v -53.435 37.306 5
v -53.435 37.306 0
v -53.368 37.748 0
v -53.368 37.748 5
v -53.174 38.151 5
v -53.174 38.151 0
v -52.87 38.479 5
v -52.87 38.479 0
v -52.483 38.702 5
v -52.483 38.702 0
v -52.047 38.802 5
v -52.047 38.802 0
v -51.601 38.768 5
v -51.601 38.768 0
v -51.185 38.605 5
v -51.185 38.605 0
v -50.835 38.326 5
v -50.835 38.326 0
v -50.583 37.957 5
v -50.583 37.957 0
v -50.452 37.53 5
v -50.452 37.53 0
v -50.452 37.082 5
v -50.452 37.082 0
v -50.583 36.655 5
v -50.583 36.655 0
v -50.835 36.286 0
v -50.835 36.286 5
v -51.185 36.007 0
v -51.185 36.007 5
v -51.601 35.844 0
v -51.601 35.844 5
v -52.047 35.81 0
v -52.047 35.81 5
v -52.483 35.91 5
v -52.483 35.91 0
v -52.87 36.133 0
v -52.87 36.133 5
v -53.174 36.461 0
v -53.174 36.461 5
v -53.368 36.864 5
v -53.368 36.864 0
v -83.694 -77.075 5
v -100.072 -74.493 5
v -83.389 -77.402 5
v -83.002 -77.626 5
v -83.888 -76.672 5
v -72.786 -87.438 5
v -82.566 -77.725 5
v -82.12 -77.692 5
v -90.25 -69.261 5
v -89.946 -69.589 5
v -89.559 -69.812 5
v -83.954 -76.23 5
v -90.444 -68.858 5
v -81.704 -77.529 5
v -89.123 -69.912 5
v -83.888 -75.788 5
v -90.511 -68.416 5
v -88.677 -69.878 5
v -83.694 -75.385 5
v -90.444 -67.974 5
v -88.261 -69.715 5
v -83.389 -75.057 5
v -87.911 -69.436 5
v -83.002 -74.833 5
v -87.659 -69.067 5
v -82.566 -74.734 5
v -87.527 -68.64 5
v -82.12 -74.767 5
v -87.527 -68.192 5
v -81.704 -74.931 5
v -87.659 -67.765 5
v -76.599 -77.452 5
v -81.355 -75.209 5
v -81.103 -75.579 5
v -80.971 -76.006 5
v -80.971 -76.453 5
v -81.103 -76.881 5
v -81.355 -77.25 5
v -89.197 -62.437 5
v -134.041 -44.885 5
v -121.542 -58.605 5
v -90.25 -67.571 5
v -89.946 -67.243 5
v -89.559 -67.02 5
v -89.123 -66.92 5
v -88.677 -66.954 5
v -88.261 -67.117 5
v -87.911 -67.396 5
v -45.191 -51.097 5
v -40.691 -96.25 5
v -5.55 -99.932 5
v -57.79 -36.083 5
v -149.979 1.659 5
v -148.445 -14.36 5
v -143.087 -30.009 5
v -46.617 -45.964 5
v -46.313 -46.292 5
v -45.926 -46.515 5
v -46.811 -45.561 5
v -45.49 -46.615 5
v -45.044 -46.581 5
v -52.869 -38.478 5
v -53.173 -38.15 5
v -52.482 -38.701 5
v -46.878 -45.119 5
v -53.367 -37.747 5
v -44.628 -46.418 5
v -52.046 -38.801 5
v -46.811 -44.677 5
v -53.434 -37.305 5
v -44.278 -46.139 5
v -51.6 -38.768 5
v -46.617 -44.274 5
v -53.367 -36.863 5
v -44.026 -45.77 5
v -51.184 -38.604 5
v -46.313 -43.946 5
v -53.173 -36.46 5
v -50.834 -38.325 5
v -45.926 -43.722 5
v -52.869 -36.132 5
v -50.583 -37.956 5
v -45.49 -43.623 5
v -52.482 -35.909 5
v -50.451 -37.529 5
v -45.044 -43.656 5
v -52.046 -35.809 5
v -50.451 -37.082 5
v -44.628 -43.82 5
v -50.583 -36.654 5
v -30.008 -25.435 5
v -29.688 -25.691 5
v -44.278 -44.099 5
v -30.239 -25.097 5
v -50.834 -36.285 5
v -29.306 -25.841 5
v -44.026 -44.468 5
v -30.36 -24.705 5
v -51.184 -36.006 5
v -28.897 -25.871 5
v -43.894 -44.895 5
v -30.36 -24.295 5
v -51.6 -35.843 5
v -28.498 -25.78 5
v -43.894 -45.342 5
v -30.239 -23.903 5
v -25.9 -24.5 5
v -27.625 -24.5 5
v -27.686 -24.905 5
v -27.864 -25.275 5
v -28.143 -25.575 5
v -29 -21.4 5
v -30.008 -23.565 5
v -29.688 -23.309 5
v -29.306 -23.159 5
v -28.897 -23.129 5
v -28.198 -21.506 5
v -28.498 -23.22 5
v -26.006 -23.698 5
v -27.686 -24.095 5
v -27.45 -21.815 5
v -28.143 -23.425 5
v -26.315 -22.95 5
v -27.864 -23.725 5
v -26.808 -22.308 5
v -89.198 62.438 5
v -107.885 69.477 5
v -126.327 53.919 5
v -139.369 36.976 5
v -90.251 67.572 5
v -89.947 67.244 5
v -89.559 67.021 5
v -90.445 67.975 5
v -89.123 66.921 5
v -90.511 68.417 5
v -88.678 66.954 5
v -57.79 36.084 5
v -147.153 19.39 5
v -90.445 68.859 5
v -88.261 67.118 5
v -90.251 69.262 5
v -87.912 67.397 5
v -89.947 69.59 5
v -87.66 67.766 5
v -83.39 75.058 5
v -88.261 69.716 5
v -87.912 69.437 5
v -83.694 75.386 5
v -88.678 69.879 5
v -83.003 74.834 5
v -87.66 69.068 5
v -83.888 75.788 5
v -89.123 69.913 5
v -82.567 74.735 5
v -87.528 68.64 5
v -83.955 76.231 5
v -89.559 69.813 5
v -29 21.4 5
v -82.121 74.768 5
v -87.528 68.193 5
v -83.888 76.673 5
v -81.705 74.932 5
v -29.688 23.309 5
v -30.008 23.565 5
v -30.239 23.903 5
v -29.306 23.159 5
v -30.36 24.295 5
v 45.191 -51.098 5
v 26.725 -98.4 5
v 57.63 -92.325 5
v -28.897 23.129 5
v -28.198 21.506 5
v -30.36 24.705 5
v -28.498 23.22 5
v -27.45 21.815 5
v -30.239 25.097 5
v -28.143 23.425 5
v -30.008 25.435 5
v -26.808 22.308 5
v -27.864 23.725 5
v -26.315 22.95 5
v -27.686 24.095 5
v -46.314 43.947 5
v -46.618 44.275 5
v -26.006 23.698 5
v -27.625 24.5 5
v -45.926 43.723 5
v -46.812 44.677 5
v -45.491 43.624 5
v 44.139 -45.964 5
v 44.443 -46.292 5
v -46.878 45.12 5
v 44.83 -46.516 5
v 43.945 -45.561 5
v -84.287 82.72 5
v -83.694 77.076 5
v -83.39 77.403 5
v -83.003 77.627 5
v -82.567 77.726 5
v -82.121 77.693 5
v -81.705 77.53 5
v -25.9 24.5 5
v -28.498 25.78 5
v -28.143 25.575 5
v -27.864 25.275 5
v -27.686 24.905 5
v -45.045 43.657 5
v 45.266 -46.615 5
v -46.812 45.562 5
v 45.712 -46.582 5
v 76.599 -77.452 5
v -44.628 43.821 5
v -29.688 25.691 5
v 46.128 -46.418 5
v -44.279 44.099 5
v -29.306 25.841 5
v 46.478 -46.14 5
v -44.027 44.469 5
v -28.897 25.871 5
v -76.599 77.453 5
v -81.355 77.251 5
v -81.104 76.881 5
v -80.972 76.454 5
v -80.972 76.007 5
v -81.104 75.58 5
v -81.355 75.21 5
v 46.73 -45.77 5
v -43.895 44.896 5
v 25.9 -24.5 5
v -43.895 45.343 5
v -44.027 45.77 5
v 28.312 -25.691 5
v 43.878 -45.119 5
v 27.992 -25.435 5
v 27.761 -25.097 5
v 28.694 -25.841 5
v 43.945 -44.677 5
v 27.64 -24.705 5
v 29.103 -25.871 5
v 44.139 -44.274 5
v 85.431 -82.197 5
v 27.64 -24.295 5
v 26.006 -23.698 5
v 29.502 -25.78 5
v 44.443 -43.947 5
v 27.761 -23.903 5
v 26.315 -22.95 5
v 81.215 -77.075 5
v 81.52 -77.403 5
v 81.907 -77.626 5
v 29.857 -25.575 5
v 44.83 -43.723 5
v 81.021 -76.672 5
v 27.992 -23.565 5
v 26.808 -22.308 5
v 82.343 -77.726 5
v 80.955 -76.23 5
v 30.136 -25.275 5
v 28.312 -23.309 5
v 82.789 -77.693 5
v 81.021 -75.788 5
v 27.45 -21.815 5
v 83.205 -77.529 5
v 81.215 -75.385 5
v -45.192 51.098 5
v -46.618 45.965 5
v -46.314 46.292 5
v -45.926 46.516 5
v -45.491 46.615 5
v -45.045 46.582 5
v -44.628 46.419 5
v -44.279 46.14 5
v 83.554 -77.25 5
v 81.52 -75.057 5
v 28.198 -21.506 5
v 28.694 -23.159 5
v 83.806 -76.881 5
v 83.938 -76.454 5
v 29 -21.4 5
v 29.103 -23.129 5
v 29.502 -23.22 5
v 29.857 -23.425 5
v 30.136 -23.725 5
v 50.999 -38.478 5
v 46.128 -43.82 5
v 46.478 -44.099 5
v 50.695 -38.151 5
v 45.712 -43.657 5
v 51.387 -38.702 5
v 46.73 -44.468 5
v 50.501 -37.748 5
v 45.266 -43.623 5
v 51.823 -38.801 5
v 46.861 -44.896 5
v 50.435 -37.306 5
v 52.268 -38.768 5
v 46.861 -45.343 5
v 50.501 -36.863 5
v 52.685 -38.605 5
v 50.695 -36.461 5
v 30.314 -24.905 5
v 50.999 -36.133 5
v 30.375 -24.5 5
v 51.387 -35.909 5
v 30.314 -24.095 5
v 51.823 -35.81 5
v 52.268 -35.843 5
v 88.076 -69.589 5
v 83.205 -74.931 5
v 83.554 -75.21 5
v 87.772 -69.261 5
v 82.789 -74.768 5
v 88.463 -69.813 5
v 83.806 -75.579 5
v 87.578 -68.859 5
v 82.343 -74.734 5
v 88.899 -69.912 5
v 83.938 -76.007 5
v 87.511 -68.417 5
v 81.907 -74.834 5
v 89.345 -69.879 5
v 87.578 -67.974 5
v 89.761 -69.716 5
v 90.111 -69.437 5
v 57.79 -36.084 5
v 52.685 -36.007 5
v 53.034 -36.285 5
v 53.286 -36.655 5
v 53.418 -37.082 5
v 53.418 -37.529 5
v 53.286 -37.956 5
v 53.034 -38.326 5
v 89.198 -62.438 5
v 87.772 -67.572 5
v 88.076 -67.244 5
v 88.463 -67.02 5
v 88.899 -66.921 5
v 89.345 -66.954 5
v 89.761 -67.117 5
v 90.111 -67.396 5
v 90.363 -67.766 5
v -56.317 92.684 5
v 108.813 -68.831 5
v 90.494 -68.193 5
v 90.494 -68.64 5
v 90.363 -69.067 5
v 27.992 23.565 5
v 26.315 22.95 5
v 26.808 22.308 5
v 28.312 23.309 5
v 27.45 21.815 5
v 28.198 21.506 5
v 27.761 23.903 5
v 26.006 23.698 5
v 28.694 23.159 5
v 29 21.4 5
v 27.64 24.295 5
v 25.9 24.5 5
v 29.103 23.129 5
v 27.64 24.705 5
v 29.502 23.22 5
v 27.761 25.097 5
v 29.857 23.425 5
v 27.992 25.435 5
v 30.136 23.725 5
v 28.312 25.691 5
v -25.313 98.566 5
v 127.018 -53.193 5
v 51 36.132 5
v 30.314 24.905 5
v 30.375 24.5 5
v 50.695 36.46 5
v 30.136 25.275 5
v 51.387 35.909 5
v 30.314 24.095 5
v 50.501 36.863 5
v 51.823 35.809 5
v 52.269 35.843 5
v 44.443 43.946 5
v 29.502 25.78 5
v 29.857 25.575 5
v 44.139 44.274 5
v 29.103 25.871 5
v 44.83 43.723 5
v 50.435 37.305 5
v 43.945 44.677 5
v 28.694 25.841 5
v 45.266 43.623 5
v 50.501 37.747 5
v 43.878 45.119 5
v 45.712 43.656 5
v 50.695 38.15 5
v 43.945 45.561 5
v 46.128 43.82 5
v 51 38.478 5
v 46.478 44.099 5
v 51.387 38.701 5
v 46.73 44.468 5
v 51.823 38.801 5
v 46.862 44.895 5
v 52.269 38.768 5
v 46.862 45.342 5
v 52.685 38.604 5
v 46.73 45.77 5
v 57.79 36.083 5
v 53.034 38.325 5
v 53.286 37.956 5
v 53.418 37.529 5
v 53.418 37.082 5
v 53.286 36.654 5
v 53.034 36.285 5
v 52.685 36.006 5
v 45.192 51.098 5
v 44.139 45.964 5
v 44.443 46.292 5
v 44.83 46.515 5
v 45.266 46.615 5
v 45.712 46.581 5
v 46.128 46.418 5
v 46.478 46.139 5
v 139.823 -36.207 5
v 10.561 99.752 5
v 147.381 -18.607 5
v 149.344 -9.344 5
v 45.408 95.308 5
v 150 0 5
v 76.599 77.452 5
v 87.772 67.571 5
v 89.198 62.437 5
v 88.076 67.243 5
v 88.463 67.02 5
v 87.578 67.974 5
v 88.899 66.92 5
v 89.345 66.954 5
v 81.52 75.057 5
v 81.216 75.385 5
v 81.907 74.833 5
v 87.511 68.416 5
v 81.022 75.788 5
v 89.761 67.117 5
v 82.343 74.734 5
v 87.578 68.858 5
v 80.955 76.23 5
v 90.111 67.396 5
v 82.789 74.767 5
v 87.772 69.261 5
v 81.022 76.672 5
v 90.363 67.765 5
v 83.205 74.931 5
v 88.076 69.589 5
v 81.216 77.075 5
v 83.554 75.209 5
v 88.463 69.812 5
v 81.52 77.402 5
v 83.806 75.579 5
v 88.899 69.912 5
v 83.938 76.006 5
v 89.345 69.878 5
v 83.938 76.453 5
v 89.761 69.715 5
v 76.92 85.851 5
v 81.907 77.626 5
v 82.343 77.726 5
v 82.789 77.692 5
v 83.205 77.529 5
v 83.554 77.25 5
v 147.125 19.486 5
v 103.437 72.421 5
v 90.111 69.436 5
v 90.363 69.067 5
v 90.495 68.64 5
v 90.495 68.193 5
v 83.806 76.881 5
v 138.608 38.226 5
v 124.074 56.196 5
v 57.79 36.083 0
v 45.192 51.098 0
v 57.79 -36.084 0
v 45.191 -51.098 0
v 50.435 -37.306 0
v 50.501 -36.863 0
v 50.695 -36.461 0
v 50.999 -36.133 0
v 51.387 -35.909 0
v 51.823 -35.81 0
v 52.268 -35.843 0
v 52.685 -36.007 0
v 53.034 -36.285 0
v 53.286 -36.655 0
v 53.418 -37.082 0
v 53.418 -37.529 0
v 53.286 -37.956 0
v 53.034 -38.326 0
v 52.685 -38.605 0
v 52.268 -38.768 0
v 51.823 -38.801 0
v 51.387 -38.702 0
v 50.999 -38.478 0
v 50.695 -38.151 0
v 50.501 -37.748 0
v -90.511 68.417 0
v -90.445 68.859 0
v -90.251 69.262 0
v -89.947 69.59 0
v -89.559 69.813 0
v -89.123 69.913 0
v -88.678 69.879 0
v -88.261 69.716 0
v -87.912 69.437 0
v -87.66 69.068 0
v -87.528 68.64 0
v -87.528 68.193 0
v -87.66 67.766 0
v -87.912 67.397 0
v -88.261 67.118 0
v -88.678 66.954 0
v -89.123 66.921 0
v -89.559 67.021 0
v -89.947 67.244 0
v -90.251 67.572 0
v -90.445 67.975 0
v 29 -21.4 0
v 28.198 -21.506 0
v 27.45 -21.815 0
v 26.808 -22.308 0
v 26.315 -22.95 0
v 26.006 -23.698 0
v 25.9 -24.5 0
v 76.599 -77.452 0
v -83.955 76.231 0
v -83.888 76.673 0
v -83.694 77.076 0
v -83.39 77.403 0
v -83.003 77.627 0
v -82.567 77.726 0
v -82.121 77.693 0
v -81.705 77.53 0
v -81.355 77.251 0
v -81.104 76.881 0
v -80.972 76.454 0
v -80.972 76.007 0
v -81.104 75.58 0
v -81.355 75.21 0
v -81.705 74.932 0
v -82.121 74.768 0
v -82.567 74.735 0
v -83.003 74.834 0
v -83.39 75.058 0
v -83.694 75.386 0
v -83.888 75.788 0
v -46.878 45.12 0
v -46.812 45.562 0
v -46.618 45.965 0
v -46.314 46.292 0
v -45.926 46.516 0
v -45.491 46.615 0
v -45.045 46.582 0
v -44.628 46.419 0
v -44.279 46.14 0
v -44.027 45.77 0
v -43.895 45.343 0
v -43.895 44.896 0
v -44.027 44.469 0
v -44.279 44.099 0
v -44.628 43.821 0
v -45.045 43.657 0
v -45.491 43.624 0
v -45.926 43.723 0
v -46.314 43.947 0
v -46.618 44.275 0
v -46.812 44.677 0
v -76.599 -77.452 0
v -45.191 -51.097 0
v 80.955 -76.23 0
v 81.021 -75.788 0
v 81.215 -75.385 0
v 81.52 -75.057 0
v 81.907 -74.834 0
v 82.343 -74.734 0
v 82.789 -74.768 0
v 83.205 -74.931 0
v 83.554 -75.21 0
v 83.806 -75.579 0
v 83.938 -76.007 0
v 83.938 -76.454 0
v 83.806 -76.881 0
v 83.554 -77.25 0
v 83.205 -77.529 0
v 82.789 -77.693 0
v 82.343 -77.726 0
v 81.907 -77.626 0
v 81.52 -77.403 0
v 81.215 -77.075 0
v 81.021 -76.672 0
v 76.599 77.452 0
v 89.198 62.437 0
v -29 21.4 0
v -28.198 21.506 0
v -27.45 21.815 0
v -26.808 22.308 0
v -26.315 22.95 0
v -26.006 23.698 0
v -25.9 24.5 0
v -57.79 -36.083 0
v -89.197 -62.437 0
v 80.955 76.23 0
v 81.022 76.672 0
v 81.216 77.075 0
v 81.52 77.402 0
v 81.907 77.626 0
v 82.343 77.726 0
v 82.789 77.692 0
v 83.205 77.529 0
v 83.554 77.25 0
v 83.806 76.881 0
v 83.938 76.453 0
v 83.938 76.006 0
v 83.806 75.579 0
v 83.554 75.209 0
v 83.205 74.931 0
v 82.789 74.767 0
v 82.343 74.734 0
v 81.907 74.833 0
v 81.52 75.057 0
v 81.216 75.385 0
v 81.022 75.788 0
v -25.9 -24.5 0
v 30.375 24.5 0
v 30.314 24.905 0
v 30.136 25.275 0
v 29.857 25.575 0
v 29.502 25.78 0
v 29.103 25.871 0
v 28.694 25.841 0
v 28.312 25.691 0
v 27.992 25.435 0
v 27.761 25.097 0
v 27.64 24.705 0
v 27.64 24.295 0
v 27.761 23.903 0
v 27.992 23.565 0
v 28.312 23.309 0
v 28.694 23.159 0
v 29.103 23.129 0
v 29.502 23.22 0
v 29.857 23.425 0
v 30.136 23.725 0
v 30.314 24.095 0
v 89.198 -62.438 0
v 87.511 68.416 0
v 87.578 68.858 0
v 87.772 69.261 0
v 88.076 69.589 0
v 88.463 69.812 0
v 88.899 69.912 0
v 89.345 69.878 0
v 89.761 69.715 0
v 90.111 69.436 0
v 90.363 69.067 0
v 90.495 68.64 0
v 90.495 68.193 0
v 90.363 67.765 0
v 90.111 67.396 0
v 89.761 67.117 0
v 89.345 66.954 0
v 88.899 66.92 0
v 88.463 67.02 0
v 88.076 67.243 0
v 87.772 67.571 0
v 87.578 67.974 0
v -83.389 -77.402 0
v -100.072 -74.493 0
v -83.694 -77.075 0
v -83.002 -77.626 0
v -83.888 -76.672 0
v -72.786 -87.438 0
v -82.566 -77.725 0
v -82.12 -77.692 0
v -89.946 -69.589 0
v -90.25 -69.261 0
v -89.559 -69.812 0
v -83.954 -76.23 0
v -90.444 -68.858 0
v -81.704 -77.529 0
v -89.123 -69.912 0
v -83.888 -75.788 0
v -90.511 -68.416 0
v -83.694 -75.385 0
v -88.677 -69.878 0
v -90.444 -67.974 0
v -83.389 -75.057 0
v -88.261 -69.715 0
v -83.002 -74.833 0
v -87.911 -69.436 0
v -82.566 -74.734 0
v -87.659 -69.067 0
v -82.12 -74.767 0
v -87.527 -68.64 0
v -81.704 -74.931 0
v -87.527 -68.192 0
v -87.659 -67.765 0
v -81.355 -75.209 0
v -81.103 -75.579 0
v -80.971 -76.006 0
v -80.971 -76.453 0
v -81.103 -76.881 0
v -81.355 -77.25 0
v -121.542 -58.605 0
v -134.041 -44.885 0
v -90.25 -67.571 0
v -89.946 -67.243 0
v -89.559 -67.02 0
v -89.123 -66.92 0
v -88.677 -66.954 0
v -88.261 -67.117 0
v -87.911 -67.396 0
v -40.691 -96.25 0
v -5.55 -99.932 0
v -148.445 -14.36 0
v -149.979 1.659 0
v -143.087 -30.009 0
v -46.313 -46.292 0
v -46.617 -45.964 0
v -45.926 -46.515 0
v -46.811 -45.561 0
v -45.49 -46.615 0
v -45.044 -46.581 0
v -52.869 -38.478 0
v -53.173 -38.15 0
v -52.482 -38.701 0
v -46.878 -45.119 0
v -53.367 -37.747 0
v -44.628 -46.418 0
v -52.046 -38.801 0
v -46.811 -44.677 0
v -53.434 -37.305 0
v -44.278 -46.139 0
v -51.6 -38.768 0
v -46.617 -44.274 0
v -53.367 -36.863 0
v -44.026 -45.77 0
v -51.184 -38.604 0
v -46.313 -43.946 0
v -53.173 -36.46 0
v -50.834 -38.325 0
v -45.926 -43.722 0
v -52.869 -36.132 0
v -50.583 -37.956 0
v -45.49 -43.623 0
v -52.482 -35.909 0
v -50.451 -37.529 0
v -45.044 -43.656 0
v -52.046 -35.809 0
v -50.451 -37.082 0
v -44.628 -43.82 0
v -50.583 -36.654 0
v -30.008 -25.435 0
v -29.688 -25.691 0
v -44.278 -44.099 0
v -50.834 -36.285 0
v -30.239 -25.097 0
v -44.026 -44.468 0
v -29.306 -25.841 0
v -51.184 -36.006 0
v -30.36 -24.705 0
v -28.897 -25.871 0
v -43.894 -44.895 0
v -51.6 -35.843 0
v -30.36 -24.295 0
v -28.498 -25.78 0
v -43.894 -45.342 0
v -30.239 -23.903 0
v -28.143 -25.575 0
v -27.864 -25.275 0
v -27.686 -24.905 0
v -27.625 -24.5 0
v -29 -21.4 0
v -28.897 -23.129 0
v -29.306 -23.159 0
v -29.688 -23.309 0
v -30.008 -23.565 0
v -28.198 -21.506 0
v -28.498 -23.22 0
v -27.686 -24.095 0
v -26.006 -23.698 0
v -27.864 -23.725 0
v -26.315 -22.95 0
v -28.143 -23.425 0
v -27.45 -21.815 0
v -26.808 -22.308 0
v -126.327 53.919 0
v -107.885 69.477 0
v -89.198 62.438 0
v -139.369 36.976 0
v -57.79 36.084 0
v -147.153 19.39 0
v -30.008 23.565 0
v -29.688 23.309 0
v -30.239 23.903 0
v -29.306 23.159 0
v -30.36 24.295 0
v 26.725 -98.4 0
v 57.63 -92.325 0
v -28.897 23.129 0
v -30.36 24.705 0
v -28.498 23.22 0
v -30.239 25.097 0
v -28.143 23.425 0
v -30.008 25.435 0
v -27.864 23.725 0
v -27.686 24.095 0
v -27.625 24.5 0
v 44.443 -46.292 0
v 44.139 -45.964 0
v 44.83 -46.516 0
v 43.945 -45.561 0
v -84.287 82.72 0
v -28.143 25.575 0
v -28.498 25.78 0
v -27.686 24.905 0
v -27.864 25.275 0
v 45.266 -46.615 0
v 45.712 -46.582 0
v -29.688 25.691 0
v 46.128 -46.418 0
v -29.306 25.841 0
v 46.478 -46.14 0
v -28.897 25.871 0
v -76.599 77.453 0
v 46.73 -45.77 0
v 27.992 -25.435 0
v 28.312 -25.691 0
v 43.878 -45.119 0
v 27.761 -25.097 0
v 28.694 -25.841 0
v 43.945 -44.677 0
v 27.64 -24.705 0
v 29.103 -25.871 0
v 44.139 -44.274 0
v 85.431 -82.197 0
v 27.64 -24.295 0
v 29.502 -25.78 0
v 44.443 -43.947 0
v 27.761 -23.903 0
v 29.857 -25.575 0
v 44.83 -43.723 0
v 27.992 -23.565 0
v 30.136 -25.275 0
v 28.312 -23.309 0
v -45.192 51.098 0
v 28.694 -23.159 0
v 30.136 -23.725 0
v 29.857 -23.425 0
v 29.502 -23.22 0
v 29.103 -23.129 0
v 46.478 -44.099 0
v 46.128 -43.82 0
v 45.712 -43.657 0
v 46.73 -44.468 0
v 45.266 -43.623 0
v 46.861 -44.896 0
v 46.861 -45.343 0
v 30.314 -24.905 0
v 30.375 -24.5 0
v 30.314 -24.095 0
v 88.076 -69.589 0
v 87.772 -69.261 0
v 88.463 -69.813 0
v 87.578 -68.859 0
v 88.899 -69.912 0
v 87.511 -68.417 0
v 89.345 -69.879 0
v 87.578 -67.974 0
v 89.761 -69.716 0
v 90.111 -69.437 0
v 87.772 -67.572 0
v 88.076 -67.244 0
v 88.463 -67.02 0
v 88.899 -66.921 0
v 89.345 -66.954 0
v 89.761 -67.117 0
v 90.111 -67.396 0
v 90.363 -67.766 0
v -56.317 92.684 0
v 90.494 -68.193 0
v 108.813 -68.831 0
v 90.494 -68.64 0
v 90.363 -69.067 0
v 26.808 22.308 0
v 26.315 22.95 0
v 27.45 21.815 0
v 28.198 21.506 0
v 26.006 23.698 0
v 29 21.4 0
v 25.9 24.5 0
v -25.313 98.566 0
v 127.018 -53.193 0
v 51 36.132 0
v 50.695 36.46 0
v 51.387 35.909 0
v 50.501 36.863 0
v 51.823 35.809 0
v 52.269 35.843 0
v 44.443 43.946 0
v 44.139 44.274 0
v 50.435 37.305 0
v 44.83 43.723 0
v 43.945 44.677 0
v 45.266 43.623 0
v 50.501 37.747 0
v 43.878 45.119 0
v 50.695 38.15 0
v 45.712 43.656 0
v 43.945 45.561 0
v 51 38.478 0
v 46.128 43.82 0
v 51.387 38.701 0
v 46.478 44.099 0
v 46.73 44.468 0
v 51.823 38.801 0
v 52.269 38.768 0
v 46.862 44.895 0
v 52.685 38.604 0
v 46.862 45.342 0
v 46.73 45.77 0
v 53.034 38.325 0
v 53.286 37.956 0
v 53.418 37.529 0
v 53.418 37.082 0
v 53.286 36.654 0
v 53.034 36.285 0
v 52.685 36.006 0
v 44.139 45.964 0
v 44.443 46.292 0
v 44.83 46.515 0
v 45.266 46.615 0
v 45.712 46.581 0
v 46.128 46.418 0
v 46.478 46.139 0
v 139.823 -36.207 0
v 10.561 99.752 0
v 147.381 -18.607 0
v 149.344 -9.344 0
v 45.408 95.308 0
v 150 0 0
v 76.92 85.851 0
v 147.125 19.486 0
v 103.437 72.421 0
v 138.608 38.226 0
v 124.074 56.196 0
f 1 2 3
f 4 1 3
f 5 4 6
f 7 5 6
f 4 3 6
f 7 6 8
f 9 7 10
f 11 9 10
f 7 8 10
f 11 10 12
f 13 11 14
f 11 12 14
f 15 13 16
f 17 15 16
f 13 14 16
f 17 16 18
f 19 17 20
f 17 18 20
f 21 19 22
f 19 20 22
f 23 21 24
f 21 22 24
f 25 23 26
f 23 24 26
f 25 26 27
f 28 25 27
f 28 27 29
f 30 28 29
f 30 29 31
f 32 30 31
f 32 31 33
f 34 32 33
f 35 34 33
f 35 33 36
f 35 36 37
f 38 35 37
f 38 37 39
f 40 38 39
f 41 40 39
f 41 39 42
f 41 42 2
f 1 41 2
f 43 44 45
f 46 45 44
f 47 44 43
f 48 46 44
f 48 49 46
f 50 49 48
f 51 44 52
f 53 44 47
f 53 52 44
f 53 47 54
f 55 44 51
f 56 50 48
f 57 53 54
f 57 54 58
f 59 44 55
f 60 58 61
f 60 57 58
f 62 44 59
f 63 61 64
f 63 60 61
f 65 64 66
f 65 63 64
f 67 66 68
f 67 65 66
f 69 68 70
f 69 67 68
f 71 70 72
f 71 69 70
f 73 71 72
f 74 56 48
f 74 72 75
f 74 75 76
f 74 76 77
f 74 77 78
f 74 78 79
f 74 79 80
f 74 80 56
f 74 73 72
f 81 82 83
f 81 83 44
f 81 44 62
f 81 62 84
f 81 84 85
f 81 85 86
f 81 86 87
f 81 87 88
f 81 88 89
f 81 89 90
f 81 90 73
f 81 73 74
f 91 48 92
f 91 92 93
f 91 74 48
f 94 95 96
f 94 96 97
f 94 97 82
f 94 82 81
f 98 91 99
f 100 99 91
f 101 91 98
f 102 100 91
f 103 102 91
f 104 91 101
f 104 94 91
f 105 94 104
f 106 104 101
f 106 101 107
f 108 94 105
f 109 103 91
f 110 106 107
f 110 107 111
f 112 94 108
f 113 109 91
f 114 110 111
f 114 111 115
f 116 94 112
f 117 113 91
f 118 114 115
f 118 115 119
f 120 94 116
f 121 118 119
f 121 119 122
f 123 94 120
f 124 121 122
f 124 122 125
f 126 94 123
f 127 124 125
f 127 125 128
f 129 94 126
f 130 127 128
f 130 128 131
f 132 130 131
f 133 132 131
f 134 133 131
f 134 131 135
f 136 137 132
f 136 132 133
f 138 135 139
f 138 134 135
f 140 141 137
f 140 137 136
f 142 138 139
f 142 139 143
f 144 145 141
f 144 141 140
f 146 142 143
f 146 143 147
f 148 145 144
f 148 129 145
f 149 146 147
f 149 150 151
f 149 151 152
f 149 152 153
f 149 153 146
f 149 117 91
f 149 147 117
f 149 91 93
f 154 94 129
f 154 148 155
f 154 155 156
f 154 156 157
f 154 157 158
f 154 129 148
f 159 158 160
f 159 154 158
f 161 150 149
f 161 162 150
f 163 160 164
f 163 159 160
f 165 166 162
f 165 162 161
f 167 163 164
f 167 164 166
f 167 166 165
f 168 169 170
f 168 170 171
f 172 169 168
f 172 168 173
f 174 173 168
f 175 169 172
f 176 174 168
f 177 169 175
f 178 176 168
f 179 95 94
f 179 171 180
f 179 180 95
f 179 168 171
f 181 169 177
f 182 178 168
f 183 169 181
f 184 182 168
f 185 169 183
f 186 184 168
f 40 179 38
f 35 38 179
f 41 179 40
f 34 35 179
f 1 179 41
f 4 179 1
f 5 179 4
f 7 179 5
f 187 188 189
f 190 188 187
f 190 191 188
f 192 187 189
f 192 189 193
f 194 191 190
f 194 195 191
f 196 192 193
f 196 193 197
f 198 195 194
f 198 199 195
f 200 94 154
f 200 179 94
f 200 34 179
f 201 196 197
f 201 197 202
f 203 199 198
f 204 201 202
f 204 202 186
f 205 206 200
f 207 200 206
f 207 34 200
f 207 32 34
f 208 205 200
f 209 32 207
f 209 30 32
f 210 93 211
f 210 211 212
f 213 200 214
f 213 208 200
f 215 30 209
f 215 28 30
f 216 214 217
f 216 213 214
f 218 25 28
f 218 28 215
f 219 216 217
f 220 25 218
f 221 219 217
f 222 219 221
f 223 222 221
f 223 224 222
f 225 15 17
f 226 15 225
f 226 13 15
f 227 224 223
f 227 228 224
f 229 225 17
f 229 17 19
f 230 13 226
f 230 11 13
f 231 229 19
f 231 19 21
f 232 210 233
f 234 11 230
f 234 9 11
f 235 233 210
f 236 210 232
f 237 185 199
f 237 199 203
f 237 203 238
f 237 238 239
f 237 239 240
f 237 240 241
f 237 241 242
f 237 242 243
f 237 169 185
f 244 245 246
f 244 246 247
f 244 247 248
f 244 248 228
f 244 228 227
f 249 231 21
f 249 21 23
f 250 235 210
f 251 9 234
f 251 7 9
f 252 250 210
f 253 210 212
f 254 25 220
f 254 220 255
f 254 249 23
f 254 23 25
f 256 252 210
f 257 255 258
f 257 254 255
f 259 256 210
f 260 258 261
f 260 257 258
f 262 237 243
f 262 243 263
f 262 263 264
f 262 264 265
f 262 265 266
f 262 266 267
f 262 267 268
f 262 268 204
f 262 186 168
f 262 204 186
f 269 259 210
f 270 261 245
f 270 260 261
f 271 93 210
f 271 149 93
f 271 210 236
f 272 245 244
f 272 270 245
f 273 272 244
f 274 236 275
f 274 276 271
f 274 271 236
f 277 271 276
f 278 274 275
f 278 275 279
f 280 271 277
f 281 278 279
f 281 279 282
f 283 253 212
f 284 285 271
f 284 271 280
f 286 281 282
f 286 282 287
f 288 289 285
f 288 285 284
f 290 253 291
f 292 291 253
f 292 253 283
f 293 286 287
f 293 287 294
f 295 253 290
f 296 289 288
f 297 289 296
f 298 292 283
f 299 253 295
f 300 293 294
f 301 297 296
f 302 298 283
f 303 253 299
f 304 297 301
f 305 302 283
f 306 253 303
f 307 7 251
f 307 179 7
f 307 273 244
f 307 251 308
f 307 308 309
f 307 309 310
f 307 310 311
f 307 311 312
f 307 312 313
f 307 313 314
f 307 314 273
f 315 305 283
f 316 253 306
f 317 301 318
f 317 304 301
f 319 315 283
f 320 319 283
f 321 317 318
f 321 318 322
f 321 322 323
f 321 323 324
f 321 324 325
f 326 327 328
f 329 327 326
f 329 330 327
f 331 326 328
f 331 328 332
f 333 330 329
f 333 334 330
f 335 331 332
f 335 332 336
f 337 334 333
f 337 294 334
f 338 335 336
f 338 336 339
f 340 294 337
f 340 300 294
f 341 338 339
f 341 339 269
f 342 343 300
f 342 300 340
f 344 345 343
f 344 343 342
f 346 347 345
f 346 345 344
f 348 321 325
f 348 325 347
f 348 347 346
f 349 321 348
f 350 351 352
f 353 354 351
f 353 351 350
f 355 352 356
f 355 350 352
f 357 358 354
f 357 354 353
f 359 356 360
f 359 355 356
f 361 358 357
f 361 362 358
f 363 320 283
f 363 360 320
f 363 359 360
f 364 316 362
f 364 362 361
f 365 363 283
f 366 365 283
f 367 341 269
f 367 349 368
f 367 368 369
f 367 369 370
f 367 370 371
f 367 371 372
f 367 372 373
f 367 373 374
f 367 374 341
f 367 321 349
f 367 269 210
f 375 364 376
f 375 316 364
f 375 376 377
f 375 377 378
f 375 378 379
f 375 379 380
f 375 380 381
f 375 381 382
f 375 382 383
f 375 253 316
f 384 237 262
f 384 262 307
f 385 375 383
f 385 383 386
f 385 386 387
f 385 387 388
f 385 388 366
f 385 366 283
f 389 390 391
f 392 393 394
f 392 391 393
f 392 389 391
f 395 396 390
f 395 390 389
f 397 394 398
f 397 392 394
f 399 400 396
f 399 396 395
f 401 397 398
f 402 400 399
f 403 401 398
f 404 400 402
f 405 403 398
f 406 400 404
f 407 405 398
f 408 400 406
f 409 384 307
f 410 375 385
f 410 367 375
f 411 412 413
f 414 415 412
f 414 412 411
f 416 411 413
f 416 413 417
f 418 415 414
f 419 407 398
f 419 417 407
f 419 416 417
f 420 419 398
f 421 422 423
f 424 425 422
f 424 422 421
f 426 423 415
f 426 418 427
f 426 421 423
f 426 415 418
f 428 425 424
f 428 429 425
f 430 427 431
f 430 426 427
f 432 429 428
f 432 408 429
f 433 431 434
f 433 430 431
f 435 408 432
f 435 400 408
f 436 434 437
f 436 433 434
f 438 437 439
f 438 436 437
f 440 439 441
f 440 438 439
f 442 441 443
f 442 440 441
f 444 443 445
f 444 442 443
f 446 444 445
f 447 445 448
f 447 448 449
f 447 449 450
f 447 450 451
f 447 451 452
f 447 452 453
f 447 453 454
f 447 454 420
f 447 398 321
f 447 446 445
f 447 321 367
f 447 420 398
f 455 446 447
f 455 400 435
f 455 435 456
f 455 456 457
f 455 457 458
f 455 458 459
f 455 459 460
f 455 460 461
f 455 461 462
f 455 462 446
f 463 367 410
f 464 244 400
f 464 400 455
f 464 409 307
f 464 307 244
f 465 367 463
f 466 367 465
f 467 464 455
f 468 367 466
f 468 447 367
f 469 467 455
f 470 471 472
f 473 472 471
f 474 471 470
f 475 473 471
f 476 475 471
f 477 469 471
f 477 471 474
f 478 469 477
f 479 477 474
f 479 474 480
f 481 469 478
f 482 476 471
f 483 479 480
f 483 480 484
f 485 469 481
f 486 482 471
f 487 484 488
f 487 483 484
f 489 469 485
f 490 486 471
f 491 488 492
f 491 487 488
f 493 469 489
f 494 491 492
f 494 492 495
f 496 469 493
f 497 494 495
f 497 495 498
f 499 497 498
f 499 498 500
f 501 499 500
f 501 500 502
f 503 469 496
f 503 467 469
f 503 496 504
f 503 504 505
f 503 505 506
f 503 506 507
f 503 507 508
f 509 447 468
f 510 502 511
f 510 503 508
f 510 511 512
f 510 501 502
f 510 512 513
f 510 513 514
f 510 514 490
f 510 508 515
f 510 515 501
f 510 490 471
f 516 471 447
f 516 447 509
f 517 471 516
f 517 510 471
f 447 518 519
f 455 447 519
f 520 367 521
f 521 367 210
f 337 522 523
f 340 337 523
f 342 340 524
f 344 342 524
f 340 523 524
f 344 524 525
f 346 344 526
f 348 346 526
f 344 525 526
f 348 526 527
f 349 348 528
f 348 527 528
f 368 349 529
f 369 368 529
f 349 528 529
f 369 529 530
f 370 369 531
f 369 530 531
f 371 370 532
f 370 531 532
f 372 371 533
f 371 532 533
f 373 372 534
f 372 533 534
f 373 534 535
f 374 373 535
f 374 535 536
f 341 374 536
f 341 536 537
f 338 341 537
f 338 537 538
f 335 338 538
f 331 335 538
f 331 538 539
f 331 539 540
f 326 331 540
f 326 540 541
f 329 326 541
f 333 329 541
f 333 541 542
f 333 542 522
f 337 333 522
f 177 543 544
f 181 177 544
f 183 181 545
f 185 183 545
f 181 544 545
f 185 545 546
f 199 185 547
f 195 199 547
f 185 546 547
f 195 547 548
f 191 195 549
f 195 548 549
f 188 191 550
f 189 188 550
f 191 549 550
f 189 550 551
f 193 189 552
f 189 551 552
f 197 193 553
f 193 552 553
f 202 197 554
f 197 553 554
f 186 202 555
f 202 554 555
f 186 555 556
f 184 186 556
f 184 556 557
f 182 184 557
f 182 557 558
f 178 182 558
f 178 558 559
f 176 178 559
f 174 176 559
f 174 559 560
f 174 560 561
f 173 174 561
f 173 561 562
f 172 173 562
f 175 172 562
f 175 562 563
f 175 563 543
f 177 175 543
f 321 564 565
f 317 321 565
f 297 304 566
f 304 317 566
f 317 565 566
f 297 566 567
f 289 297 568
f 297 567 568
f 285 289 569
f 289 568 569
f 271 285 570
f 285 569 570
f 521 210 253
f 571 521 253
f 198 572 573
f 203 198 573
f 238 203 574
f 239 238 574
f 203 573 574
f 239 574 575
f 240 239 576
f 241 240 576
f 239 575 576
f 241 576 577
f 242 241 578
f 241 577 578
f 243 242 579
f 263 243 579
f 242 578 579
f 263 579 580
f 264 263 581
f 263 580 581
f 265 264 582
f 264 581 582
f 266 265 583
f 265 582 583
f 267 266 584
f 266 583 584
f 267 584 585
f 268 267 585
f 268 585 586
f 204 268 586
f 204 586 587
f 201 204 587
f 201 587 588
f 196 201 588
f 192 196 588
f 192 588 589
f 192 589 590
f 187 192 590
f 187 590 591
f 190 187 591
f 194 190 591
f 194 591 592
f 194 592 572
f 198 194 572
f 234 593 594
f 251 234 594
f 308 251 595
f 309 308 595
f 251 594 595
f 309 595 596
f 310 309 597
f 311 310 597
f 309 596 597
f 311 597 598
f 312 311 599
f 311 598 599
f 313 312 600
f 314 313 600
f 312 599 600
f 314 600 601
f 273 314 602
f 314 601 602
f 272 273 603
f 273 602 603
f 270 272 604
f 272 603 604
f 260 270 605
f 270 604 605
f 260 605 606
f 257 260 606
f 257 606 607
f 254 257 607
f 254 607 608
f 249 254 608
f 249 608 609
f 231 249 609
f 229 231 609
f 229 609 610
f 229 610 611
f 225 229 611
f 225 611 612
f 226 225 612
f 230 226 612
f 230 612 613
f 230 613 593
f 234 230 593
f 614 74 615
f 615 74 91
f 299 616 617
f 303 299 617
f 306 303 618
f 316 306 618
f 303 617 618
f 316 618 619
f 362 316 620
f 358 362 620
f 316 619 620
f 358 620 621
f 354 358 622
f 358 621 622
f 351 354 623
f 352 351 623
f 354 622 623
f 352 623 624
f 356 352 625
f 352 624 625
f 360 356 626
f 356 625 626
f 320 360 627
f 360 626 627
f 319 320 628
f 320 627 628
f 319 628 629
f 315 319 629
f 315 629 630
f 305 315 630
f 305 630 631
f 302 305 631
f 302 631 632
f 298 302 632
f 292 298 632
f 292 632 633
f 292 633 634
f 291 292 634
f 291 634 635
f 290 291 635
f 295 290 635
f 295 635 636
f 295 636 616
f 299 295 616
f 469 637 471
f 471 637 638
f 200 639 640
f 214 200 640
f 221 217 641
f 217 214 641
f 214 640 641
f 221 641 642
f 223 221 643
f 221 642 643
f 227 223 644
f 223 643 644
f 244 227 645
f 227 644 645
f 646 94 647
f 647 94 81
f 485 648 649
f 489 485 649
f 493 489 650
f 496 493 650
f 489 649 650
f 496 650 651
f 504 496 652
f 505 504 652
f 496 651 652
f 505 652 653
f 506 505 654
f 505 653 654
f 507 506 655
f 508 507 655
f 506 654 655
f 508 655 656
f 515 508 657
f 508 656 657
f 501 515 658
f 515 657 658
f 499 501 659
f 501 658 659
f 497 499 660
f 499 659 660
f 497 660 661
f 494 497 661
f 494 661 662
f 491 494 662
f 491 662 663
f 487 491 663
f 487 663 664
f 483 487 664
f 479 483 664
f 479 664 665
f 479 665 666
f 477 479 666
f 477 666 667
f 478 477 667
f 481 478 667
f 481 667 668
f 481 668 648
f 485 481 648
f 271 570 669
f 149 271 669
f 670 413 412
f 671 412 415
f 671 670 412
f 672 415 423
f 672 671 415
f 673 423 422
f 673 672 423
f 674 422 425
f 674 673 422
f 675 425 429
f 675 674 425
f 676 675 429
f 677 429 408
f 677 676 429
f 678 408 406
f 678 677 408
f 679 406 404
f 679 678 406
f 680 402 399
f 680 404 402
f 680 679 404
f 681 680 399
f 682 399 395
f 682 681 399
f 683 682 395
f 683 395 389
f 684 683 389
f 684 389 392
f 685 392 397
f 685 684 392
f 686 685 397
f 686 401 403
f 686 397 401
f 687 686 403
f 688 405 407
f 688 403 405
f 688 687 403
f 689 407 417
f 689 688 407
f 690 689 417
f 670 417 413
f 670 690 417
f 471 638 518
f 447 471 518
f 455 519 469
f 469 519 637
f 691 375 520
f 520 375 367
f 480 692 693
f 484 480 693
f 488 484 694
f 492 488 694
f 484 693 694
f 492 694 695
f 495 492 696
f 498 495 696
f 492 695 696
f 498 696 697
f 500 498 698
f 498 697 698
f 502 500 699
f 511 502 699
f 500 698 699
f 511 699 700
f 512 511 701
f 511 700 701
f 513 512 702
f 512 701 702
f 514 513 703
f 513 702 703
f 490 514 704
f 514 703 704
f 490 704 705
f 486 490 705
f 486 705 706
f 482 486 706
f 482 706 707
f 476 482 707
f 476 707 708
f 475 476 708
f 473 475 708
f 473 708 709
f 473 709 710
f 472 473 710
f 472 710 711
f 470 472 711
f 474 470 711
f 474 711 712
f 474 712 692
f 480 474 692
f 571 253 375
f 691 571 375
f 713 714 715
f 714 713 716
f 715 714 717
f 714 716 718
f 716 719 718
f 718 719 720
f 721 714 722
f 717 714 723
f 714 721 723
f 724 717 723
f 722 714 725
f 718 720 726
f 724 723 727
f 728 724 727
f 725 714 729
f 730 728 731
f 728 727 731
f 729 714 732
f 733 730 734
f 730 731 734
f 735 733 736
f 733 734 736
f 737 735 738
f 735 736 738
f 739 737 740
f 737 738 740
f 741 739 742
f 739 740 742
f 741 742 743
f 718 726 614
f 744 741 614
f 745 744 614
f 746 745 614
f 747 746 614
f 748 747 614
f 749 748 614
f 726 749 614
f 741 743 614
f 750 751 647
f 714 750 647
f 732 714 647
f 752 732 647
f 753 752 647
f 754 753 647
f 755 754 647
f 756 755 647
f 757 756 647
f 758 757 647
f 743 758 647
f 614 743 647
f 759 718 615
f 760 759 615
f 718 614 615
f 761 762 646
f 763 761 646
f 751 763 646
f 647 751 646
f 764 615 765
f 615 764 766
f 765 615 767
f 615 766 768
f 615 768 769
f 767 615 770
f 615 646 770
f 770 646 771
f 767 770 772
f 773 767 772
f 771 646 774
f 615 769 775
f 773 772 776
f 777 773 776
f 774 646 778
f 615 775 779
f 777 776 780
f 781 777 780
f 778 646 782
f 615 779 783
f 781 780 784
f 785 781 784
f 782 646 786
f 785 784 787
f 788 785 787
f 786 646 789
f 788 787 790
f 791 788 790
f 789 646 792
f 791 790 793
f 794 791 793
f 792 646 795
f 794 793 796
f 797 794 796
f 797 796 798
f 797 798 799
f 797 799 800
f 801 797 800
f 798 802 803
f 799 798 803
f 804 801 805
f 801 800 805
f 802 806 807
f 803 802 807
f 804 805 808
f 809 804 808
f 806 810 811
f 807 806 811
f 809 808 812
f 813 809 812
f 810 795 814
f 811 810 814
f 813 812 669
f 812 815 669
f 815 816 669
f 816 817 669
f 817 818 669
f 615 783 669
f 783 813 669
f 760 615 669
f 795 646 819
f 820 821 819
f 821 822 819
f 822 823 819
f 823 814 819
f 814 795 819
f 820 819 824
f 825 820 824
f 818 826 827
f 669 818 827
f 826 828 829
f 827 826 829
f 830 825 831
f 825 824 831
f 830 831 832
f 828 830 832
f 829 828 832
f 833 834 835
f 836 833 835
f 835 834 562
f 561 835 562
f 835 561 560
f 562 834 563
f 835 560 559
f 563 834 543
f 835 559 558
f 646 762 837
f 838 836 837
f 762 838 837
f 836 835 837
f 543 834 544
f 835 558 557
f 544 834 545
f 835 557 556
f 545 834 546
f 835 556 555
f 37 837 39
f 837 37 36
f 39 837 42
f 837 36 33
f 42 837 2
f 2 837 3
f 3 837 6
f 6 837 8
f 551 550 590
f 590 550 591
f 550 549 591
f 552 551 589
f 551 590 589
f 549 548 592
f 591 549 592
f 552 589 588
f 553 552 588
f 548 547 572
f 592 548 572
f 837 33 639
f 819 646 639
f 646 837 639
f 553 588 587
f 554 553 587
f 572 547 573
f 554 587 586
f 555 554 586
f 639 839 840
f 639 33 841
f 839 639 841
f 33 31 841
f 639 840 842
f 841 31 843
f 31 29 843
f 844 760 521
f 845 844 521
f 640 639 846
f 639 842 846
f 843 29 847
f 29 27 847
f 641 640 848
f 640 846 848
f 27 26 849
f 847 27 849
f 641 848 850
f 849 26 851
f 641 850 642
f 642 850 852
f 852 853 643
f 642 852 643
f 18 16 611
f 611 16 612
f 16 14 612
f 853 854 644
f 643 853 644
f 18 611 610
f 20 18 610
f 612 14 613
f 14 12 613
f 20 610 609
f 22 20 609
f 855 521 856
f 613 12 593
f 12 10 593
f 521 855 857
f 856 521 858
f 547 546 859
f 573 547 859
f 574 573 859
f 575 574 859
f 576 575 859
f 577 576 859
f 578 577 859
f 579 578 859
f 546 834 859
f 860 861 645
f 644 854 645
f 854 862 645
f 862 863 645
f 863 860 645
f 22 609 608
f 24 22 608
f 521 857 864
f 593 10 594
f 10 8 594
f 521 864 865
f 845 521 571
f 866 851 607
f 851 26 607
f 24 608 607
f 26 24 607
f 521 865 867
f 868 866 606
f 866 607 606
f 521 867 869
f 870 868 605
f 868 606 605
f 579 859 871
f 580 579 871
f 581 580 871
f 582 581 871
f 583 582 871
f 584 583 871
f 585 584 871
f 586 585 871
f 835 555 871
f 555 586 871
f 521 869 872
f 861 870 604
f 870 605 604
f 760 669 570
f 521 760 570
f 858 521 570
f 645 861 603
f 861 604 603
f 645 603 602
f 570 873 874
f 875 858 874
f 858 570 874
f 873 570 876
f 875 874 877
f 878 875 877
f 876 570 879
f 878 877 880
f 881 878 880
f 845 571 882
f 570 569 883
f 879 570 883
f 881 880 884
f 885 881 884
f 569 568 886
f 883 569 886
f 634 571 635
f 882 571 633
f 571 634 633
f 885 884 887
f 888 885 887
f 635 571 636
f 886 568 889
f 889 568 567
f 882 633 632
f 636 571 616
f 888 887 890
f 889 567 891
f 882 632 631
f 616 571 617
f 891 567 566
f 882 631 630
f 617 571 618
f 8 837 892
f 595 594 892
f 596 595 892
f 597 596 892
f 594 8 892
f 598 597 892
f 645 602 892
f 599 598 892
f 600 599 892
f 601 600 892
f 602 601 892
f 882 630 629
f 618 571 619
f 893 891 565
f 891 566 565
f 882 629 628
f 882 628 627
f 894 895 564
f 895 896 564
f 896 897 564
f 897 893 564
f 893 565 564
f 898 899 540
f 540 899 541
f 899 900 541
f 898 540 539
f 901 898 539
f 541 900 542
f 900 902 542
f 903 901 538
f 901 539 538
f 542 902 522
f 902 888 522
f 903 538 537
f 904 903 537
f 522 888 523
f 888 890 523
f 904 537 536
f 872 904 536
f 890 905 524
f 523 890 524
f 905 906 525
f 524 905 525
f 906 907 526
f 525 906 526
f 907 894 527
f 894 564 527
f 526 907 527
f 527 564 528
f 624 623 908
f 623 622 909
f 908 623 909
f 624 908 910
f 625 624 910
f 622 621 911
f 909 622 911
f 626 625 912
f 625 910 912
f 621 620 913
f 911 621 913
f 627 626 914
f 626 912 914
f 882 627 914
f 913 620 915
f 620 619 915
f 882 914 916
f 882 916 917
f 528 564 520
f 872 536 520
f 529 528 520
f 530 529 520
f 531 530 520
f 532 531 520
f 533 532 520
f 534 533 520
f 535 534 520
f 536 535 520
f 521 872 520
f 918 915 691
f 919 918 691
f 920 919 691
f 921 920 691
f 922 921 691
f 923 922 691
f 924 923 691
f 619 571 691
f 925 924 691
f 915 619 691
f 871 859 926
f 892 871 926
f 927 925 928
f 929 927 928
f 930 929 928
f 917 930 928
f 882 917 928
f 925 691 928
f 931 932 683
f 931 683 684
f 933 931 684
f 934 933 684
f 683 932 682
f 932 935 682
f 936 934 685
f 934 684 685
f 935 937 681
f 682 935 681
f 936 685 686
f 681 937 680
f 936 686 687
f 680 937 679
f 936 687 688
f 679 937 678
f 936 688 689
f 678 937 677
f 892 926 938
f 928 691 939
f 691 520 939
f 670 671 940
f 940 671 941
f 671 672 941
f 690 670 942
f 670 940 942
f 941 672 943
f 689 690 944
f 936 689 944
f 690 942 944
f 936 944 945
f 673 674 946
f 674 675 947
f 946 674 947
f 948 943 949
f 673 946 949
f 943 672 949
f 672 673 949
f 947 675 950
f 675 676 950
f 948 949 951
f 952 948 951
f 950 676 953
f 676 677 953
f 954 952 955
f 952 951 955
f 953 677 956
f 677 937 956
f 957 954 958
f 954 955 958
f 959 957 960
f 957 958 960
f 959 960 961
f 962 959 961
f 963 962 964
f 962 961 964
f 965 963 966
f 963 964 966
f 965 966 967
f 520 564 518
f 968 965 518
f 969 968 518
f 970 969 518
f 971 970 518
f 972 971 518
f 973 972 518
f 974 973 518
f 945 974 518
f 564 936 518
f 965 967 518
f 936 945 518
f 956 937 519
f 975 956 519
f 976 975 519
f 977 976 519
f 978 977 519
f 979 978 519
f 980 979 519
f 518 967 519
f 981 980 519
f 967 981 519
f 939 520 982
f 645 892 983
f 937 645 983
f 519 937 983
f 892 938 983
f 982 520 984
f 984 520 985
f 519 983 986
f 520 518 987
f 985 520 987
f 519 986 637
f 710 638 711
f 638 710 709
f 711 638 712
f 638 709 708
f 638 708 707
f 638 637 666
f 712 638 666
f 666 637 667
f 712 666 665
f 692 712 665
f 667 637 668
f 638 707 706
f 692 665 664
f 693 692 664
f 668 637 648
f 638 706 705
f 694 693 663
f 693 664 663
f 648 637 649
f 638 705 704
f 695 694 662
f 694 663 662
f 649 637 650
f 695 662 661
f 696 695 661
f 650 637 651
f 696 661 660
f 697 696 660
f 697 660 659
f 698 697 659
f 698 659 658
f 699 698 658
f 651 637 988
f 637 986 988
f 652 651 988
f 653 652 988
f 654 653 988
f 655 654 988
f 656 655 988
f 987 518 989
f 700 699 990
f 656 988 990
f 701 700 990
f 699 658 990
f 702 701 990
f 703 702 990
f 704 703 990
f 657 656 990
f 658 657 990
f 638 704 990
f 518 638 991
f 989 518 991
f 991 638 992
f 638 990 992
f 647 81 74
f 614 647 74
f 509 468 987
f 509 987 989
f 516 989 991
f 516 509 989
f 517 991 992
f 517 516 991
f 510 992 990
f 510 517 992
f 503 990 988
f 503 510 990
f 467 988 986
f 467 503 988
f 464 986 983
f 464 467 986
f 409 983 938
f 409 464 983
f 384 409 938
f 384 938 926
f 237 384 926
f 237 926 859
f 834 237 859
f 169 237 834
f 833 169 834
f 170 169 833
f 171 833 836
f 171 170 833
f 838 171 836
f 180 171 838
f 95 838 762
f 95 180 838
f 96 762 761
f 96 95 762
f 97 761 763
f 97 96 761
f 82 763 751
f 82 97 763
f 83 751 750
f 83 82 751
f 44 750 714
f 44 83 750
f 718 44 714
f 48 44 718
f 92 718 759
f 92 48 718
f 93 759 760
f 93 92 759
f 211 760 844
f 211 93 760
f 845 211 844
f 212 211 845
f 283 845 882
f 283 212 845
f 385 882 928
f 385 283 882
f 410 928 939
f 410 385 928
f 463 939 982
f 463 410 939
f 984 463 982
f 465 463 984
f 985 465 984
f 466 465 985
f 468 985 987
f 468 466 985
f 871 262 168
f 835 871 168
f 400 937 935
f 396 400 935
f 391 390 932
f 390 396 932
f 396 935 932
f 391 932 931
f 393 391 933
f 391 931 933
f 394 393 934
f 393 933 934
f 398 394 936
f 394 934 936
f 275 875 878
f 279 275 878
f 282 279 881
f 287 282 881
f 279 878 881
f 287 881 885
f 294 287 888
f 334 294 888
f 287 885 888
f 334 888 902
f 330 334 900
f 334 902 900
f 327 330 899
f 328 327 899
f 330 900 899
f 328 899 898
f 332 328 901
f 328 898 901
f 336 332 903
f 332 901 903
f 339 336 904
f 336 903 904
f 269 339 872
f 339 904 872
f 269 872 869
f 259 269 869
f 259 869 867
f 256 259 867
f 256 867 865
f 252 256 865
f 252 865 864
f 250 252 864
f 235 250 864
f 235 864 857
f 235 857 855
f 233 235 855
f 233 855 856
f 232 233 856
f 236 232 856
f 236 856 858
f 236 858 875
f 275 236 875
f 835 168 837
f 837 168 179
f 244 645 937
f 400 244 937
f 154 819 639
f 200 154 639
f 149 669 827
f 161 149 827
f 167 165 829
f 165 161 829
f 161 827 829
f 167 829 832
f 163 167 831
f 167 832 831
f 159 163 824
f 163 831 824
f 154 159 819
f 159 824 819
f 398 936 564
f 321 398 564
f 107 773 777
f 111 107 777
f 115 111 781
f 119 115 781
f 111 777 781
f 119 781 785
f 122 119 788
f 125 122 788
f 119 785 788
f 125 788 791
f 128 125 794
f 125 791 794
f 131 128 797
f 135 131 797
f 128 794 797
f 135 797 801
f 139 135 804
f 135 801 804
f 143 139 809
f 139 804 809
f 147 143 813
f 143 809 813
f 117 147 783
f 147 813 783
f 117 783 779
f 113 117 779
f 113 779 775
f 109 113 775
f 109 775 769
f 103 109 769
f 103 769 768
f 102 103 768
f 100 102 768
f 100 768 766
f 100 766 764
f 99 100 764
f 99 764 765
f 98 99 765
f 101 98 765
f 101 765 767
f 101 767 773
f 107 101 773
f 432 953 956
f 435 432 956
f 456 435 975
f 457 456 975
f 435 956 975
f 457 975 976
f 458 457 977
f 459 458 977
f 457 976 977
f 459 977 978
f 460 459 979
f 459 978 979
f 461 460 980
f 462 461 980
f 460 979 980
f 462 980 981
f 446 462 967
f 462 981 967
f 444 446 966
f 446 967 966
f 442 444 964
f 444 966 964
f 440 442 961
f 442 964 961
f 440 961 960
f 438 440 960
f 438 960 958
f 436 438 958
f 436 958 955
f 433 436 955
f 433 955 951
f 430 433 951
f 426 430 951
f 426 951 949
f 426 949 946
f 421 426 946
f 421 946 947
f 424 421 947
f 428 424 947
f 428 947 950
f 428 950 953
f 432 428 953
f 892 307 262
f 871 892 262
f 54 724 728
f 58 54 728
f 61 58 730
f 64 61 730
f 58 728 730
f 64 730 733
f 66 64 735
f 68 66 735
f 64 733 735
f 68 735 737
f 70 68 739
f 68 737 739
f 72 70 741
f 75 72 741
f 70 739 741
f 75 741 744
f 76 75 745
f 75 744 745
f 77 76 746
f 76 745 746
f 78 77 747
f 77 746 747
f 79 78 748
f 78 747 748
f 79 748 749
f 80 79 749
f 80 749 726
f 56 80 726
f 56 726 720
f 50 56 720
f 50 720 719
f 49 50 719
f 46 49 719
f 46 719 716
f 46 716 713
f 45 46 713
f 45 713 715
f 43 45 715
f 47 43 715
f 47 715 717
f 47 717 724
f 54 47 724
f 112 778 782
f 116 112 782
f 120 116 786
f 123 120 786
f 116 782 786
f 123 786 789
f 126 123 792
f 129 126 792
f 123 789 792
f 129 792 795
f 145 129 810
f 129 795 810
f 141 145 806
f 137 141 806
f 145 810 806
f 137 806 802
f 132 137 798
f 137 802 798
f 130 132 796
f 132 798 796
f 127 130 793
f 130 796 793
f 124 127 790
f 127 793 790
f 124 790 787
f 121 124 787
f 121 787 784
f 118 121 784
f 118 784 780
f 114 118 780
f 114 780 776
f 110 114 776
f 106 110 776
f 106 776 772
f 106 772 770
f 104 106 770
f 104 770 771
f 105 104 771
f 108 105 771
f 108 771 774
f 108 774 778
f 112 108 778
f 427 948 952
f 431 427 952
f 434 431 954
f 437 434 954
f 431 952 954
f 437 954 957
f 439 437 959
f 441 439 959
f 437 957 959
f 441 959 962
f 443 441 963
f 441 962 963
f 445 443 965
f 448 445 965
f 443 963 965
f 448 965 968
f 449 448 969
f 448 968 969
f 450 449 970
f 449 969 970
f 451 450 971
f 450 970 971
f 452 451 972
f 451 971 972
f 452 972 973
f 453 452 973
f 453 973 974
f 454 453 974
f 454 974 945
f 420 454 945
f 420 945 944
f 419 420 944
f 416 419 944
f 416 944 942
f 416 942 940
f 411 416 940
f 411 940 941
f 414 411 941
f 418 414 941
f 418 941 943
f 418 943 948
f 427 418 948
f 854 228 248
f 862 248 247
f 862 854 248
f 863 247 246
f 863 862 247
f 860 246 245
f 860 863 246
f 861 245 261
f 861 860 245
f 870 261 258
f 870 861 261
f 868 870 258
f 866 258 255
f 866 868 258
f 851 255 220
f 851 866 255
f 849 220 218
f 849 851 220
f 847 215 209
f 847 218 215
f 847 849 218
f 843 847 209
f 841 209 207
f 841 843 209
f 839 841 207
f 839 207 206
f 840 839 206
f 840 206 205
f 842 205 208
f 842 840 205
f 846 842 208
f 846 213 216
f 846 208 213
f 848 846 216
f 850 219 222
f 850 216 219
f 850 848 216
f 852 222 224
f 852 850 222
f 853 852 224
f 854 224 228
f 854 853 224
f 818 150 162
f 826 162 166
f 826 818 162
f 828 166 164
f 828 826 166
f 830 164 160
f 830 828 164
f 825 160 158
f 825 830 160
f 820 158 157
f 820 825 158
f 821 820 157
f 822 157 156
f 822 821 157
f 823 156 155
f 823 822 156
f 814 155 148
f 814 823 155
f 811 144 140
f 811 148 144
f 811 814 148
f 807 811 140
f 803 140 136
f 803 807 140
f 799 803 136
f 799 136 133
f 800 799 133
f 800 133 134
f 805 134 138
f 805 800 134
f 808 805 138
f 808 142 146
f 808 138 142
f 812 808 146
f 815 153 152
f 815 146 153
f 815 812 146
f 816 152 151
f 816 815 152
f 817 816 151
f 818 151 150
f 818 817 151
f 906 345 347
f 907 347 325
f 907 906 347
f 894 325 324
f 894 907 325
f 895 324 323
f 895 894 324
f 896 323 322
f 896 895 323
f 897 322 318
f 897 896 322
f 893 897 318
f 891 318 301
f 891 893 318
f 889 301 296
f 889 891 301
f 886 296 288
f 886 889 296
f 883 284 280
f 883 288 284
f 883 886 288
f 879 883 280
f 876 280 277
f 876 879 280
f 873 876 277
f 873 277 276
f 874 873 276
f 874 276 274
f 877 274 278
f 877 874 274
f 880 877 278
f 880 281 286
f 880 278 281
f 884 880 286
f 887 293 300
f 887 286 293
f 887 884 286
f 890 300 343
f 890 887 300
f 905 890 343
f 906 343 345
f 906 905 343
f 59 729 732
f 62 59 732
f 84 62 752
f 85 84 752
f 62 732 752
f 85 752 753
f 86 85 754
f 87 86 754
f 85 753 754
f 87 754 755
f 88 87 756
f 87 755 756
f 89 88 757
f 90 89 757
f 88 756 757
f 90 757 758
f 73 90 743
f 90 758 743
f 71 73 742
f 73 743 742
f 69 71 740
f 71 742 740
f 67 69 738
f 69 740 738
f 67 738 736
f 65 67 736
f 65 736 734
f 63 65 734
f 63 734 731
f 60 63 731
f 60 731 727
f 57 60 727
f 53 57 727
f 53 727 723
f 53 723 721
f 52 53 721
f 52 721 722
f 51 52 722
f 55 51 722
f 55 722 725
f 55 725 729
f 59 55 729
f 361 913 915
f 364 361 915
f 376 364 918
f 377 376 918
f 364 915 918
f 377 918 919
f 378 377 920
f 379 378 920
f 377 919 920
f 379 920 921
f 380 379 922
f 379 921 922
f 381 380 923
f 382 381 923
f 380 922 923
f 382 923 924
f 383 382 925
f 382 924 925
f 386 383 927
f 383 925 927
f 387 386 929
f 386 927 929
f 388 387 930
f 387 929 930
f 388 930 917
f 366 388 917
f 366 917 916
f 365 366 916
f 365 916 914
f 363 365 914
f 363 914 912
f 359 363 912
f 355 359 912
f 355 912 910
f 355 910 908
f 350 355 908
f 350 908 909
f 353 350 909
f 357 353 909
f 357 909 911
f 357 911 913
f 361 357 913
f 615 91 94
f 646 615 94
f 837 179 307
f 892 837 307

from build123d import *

# Parameters (mm, degrees)
SKETCH1_RX               = 150
SKETCH1_RY               = 100
BOSS_EXTRUDE1_DEPTH      = 5
CUT_EXTRUDE1_DEPTH       = 181.346887969
CUT_EXTRUDE2_DEPTH       = 181.346887969
CUT_EXTRUDE3_DEPTH       = 181.346887969
CUT_EXTRUDE4_DEPTH       = 181.346887969
CUT_EXTRUDE5_DEPTH       = 181.346887969
SKETCH11_W               = 1.375
SKETCH11_H               = 12.5
SKETCH12_W               = 1.375
SKETCH12_H               = 12.5
SKETCH13_W               = 1.375
SKETCH13_H               = 12.5
SKETCH14_W               = 1.375
SKETCH14_H               = 12.5
F_3_0_3_DIAMETER_HOLE1_D = 3


with BuildPart() as part:
    # Sketch1 → Boss-Extrude1 (new body)
    with BuildSketch(Plane.XY.offset(5)):
        with Locations(Location((0, 0), (0, 0, 0))):
            Ellipse(SKETCH1_RX, SKETCH1_RY)
    extrude(amount=-BOSS_EXTRUDE1_DEPTH)

    # Sketch2 → Cut-Extrude1 (cut, through all)
    with BuildSketch(Plane(origin=(0, 0, 0), x_dir=(-1, 0, 0), z_dir=(0, 0, -1))):
        with BuildLine():
            Line((25.9, 24.5), (-25.9, 24.5))
            ThreePointArc((-25.9, 24.5), (-26.807968978, 22.307968978), (-29, 21.4))
            Line((-29, 21.4), (-29, -21.4))
            ThreePointArc((-29, -21.4), (-26.807968978, -22.307968978), (-25.9, -24.5))
            Line((-25.9, -24.5), (25.9, -24.5))
            ThreePointArc((25.9, -24.5), (26.807968978, -22.307968978), (29, -21.4))
            Line((29, -21.4), (29, 21.4))
            ThreePointArc((29, 21.4), (26.807968978, 22.307968978), (25.9, 24.5))
        make_face()
    extrude(amount=-CUT_EXTRUDE1_DEPTH, mode=Mode.SUBTRACT)

    # Sketch7 → Cut-Extrude2 (cut, through all)
    with BuildSketch(Plane.XY.offset(5)):
        Polygon((45.191487885, -51.097974081), (76.599310052, -77.452266078), (89.197947202, -62.437794993), (57.790125034, -36.083502996), align=None)
    extrude(amount=-CUT_EXTRUDE2_DEPTH, mode=Mode.SUBTRACT)

    # Sketch8 → Cut-Extrude3 (cut, through all)
    with BuildSketch(Plane.XY.offset(5)):
        Polygon((-76.598710341, -77.451785496), (-45.190888173, -51.097493499), (-57.789525323, -36.083022414), (-89.197347491, -62.437314411), align=None)
    extrude(amount=-CUT_EXTRUDE3_DEPTH, mode=Mode.SUBTRACT)

    # Sketch9 → Cut-Extrude4 (cut, through all)
    with BuildSketch(Plane.XY.offset(5)):
        Polygon((-45.191671729, 51.098342778), (-76.599493897, 77.452634775), (-89.198131047, 62.43816369), (-57.790308879, 36.083871693), align=None)
    extrude(amount=-CUT_EXTRUDE4_DEPTH, mode=Mode.SUBTRACT)

    # Sketch10 → Cut-Extrude5 (cut, through all)
    with BuildSketch(Plane(origin=(0, 0, 0), x_dir=(-1, 0, 0), z_dir=(0, 0, -1))):
        Polygon((-89.198042922, 62.437370539), (-57.790220755, 36.083078542), (-45.191583605, 51.097549627), (-76.599405773, 77.451841624), align=None)
    extrude(amount=-CUT_EXTRUDE5_DEPTH, mode=Mode.SUBTRACT)

    # Sketch11 → Cut-Revolve1 (revolve, cut)
    with BuildSketch(Plane(origin=(0, -24.5, 0), x_dir=(1, 0, 0), z_dir=(0, 1, 0))):
        with Locations((29.6875, -6.25)):
            Rectangle(SKETCH11_W, SKETCH11_H)
    revolve(axis=Axis((29, -24.5, 0), (0, 0, 1)), mode=Mode.SUBTRACT)

    # Sketch12 → Cut-Revolve2 (revolve, cut)
    with BuildSketch(Plane(origin=(0, 24.5, 0), x_dir=(1, 0, 0), z_dir=(0, 1, 0))):
        with Locations((29.6875, -6.25)):
            Rectangle(SKETCH12_W, SKETCH12_H)
    revolve(axis=Axis((29, 24.5, 0), (0, 0, 1)), mode=Mode.SUBTRACT)

    # Sketch13 → Cut-Revolve3 (revolve, cut)
    with BuildSketch(Plane(origin=(0, 24.5, 0), x_dir=(1, 0, 0), z_dir=(0, 1, 0))):
        with Locations((-28.3125, -6.25)):
            Rectangle(SKETCH13_W, SKETCH13_H)
    revolve(axis=Axis((-29, 24.5, 0), (0, 0, 1)), mode=Mode.SUBTRACT)

    # Sketch14 → Cut-Revolve4 (revolve, cut)
    with BuildSketch(Plane(origin=(0, -24.5, 0), x_dir=(1, 0, 0), z_dir=(0, 1, 0))):
        with Locations((-28.3125, -6.25)):
            Rectangle(SKETCH14_W, SKETCH14_H)
    revolve(axis=Axis((-29, -24.5, 0), (0, 0, 1)), mode=Mode.SUBTRACT)

    # Ø3.0 (3) Diameter Hole1 (through all)
    with Locations(Plane.XY.offset(5)):
        with Locations((82.454776258, -76.230171352), (89.011209876, -68.416518032), (45.378225211, -45.119251043), (-45.378409055, 45.119619739), (-45.377625499, -45.118770461), (-51.934059118, -37.305117141), (-82.454176546, -76.22969077), (-89.010610165, -68.41603745), (51.934658829, -37.305597723), (51.93475455, 37.305173269), (45.378320931, 45.118826588), (82.454871978, 76.229746897), (-51.934842674, 37.305966419), (-82.454960102, 76.230540048), (-89.011393721, 68.416886728), (89.011305596, 68.416093578)):
            Hole(F_3_0_3_DIAMETER_HOLE1_D / 2)


solid = part.part
